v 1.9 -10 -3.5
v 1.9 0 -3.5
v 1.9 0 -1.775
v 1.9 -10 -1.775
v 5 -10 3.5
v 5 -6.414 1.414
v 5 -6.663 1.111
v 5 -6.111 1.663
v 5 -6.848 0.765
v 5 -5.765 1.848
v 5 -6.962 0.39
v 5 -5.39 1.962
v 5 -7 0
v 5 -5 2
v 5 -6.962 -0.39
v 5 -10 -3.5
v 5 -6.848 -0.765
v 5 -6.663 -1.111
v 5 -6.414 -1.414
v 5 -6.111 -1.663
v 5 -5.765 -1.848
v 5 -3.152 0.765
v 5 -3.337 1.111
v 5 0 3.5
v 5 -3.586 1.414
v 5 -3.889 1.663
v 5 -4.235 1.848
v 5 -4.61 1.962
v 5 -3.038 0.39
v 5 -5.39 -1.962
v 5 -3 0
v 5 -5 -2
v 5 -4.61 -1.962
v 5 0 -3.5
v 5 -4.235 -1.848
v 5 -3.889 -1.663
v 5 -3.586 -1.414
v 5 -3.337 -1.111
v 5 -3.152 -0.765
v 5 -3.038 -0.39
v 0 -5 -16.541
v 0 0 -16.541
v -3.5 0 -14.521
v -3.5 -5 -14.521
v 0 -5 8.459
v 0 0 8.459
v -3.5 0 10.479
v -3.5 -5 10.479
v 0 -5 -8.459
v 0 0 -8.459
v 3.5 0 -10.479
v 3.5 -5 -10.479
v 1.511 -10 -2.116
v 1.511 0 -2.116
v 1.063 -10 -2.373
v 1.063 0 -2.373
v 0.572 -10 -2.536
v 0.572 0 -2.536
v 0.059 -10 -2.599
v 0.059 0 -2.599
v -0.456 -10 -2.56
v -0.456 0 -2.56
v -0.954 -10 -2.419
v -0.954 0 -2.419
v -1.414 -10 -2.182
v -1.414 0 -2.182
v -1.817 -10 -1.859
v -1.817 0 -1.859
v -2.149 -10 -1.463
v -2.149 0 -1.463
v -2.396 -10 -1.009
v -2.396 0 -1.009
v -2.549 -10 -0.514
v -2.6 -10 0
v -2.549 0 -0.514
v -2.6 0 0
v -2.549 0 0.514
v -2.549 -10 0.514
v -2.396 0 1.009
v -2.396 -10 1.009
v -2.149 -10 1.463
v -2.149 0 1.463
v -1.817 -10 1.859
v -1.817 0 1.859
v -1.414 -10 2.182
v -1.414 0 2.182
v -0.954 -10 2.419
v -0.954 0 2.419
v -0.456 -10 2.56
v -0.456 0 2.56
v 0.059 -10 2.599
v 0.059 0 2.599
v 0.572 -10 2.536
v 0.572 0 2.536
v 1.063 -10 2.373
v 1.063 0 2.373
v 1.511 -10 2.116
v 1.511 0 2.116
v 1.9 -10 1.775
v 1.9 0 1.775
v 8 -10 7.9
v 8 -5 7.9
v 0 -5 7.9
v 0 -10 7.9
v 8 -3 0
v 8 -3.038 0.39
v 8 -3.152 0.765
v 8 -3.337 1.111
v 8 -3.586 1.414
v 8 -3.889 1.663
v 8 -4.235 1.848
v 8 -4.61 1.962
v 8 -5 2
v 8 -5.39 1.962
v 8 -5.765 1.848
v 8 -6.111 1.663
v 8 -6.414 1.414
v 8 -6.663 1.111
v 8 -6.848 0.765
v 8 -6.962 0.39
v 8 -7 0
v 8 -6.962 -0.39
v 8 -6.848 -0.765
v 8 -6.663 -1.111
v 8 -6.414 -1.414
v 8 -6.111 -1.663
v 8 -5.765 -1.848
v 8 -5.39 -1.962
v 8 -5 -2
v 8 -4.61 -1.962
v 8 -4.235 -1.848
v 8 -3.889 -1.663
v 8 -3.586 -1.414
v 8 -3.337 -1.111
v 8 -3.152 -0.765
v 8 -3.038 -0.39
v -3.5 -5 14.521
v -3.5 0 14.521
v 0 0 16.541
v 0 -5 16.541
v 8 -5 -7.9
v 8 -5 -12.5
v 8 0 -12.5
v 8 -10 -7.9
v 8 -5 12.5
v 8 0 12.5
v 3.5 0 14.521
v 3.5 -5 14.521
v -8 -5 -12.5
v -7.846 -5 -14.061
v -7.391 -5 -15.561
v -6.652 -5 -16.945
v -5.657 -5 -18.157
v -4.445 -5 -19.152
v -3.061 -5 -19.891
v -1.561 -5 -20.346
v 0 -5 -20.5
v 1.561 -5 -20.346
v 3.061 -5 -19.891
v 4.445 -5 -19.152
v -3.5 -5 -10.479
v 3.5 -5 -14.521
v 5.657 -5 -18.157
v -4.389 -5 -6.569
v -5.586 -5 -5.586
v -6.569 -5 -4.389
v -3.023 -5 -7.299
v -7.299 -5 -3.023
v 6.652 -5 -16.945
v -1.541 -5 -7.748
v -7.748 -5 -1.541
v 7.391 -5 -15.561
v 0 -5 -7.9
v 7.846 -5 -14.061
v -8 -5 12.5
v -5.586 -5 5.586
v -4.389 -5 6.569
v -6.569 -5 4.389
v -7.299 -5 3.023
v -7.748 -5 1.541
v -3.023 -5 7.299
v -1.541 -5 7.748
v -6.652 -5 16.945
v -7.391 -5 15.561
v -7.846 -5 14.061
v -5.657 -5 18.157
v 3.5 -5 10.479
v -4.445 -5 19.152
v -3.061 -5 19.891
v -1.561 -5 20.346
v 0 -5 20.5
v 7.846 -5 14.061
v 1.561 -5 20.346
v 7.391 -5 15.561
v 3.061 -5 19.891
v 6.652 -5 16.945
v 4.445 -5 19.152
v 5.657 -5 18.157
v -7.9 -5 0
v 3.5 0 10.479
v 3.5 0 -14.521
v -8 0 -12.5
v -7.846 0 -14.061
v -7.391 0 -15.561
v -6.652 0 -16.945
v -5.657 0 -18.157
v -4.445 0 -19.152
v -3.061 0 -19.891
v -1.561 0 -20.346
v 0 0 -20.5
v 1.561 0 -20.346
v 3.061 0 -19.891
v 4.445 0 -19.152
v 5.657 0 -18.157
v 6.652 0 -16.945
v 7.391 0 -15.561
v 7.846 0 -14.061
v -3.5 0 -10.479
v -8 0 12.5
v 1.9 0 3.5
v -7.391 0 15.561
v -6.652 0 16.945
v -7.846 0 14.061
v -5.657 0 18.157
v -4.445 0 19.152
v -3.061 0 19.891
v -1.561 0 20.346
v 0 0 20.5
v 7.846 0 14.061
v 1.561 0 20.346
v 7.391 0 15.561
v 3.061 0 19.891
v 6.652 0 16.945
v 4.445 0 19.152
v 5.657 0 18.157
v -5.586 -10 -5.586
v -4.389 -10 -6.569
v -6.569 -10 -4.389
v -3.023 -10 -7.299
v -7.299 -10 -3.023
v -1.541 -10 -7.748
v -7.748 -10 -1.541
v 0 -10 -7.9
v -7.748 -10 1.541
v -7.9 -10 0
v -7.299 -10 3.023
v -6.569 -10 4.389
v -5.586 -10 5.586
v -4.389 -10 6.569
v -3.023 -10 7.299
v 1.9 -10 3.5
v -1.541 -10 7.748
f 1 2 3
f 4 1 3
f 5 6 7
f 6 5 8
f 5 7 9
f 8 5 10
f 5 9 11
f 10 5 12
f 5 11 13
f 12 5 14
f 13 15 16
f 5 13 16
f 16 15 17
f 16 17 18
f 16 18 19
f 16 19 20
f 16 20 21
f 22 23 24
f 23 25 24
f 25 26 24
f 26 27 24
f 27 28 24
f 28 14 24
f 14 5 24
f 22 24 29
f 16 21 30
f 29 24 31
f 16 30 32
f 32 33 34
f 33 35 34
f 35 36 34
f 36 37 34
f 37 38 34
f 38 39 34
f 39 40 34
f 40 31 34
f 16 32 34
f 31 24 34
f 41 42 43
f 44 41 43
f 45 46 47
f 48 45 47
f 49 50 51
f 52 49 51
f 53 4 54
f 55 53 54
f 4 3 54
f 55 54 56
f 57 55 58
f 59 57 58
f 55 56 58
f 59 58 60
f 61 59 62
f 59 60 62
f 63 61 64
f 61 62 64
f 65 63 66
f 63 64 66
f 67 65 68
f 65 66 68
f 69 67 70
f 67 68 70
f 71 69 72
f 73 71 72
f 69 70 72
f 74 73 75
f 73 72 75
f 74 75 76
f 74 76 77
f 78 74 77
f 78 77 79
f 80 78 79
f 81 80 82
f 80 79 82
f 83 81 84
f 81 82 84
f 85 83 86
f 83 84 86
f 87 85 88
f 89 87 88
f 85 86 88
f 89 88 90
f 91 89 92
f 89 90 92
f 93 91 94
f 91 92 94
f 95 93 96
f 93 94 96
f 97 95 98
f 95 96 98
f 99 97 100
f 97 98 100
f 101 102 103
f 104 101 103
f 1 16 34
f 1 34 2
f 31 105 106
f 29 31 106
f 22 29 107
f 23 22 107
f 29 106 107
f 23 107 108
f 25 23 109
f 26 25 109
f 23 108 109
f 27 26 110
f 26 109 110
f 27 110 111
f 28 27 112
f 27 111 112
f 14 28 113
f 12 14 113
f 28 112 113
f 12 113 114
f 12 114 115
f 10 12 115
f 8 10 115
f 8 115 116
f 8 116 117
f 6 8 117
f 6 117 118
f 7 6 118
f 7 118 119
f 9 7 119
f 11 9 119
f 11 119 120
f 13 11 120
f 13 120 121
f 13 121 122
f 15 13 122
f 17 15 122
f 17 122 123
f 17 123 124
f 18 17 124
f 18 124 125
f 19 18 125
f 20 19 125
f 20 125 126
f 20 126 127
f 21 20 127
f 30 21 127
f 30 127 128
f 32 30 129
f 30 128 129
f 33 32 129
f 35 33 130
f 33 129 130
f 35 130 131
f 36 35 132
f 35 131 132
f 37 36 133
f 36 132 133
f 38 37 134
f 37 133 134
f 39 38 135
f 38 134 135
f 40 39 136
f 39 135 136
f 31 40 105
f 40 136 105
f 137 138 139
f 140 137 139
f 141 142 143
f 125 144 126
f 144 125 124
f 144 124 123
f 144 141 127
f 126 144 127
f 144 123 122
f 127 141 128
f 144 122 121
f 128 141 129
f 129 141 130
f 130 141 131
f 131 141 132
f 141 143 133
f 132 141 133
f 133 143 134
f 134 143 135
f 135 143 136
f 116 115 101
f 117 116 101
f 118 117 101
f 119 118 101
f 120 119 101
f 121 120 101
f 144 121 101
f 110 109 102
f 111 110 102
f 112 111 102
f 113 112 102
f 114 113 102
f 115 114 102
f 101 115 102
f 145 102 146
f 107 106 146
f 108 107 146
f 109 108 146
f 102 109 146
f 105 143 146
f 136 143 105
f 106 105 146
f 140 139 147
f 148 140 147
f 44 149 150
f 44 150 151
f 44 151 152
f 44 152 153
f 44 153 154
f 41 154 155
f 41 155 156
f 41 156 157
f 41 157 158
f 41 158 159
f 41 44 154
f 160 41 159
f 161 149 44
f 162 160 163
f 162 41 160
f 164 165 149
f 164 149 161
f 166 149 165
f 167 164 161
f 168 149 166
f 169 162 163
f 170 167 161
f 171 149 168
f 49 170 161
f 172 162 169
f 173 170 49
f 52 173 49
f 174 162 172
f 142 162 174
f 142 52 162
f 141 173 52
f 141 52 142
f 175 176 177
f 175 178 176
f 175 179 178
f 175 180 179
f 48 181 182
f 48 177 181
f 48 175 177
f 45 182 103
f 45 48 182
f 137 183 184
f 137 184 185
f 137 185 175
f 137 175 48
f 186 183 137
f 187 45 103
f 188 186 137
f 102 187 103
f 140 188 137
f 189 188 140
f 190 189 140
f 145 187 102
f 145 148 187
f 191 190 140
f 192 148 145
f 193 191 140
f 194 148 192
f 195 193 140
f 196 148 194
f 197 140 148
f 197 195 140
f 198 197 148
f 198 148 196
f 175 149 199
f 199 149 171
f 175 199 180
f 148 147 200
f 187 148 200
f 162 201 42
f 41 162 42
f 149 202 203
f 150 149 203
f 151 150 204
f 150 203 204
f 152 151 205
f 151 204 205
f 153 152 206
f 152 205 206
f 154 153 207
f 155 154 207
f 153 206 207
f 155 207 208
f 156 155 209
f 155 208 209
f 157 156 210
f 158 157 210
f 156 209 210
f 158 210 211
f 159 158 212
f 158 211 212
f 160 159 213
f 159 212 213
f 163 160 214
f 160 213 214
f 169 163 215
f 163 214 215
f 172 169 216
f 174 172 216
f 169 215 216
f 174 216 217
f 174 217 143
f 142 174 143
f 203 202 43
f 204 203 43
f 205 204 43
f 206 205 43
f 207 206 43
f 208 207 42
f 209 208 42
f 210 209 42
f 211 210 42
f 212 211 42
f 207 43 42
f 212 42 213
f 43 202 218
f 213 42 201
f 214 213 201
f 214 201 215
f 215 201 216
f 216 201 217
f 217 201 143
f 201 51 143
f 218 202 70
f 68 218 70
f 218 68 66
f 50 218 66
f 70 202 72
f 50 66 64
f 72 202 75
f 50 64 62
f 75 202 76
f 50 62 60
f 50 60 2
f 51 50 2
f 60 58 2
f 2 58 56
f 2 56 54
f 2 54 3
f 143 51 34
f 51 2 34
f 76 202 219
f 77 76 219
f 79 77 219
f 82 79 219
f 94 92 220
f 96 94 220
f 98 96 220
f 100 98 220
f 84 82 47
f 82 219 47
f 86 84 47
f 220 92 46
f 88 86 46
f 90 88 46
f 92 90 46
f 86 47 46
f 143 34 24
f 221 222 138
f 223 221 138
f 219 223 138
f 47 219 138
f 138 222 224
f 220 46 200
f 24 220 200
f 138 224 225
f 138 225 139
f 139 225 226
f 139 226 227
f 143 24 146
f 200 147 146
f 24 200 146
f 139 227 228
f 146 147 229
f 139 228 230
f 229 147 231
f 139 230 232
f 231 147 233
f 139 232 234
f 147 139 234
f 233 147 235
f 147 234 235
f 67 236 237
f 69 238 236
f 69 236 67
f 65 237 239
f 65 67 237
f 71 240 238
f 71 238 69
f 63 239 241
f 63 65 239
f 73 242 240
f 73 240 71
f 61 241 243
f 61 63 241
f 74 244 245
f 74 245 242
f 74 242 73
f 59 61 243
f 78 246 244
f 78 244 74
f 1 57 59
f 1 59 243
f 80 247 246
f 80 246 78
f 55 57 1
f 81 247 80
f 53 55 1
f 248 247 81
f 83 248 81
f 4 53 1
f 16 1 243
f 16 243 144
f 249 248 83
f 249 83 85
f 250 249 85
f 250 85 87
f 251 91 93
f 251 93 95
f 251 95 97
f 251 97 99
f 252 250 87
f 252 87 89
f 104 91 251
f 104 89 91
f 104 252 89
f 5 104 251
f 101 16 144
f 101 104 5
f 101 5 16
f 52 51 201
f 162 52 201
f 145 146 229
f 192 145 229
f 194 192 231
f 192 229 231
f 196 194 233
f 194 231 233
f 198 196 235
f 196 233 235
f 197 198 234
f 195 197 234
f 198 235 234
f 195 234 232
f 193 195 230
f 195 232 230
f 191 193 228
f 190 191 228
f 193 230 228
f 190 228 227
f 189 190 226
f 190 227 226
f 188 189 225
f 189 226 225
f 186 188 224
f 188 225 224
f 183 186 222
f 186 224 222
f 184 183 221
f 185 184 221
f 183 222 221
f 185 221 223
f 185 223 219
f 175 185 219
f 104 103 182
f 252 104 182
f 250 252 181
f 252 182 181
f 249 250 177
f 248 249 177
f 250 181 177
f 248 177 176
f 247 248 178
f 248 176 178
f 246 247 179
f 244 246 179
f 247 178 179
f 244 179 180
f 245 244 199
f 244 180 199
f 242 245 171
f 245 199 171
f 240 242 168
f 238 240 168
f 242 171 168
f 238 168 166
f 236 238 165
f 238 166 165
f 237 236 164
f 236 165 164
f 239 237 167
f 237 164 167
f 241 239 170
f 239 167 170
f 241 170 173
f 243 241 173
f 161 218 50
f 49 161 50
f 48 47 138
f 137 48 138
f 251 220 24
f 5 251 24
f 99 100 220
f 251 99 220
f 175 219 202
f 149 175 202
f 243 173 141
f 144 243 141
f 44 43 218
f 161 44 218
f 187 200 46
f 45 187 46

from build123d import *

# Parameters (mm, degrees)
F1_DEPTH = 5
F3_DEPTH = 5
F4_R     = 2
F5_DEPTH = 6.1


with BuildPart() as f1:
    # F0 (on Front) → F1 (new body)
    with BuildSketch(Plane.XZ):
        with BuildLine():
            ThreePointArc((-8, -12.5), (0, -20.5), (8, -12.5))
            Line((8, -12.5), (8, 12.5))
            ThreePointArc((8, 12.5), (0, 20.5), (-8, 12.5))
            Line((-8, 12.5), (-8, -12.5))
        make_face()
        Polygon((0, -8.458548), (3.5, -10.479274), (3.5, -14.520726), (0, -16.541452), (-3.5, -14.520726), (-3.5, -10.479274), align=None, mode=Mode.SUBTRACT)
        with BuildLine():
            ThreePointArc((1.9, -1.774824), (-2.6, 0), (1.9, 1.774824))
            Line((1.9, 1.774824), (1.9, 3.5))
            Line((1.9, 3.5), (5, 3.5))
            Line((5, 3.5), (5, -3.5))
            Line((5, -3.5), (1.9, -3.5))
            Line((1.9, -3.5), (1.9, -1.774824))
        make_face(mode=Mode.SUBTRACT)
        Polygon((0, 16.541452), (3.5, 14.520726), (3.5, 10.479274), (0, 8.458548), (-3.5, 10.479274), (-3.5, 14.520726), align=None, mode=Mode.SUBTRACT)
    extrude(amount=F1_DEPTH)

    # F2 (on face) → F3 (join)
    with BuildSketch(Plane.XZ.offset(5)):
        with BuildLine():
            Line((8, 7.9), (0, 7.9))
            ThreePointArc((0, 7.9), (-7.9, 0), (0, -7.9))
            Line((0, -7.9), (8, -7.9))
            Line((8, -7.9), (8, 7.9))
        make_face()
        with BuildLine():
            ThreePointArc((1.9, -1.774824), (-2.6, 0), (1.9, 1.774824))
            Line((1.9, 1.774824), (1.9, 3.5))
            Line((1.9, 3.5), (5, 3.5))
            Line((5, 3.5), (5, -3.5))
            Line((5, -3.5), (1.9, -3.5))
            Line((1.9, -3.5), (1.9, -1.774824))
        make_face(mode=Mode.SUBTRACT)
    extrude(amount=F3_DEPTH)

    # F4 (on face) → F5 (cut, through all)
    with BuildSketch(Plane.YZ.offset(8)):
        with Locations((-5, 0)):
            Circle(F4_R)
    extrude(amount=-F5_DEPTH, mode=Mode.SUBTRACT)


solid = f1.part
